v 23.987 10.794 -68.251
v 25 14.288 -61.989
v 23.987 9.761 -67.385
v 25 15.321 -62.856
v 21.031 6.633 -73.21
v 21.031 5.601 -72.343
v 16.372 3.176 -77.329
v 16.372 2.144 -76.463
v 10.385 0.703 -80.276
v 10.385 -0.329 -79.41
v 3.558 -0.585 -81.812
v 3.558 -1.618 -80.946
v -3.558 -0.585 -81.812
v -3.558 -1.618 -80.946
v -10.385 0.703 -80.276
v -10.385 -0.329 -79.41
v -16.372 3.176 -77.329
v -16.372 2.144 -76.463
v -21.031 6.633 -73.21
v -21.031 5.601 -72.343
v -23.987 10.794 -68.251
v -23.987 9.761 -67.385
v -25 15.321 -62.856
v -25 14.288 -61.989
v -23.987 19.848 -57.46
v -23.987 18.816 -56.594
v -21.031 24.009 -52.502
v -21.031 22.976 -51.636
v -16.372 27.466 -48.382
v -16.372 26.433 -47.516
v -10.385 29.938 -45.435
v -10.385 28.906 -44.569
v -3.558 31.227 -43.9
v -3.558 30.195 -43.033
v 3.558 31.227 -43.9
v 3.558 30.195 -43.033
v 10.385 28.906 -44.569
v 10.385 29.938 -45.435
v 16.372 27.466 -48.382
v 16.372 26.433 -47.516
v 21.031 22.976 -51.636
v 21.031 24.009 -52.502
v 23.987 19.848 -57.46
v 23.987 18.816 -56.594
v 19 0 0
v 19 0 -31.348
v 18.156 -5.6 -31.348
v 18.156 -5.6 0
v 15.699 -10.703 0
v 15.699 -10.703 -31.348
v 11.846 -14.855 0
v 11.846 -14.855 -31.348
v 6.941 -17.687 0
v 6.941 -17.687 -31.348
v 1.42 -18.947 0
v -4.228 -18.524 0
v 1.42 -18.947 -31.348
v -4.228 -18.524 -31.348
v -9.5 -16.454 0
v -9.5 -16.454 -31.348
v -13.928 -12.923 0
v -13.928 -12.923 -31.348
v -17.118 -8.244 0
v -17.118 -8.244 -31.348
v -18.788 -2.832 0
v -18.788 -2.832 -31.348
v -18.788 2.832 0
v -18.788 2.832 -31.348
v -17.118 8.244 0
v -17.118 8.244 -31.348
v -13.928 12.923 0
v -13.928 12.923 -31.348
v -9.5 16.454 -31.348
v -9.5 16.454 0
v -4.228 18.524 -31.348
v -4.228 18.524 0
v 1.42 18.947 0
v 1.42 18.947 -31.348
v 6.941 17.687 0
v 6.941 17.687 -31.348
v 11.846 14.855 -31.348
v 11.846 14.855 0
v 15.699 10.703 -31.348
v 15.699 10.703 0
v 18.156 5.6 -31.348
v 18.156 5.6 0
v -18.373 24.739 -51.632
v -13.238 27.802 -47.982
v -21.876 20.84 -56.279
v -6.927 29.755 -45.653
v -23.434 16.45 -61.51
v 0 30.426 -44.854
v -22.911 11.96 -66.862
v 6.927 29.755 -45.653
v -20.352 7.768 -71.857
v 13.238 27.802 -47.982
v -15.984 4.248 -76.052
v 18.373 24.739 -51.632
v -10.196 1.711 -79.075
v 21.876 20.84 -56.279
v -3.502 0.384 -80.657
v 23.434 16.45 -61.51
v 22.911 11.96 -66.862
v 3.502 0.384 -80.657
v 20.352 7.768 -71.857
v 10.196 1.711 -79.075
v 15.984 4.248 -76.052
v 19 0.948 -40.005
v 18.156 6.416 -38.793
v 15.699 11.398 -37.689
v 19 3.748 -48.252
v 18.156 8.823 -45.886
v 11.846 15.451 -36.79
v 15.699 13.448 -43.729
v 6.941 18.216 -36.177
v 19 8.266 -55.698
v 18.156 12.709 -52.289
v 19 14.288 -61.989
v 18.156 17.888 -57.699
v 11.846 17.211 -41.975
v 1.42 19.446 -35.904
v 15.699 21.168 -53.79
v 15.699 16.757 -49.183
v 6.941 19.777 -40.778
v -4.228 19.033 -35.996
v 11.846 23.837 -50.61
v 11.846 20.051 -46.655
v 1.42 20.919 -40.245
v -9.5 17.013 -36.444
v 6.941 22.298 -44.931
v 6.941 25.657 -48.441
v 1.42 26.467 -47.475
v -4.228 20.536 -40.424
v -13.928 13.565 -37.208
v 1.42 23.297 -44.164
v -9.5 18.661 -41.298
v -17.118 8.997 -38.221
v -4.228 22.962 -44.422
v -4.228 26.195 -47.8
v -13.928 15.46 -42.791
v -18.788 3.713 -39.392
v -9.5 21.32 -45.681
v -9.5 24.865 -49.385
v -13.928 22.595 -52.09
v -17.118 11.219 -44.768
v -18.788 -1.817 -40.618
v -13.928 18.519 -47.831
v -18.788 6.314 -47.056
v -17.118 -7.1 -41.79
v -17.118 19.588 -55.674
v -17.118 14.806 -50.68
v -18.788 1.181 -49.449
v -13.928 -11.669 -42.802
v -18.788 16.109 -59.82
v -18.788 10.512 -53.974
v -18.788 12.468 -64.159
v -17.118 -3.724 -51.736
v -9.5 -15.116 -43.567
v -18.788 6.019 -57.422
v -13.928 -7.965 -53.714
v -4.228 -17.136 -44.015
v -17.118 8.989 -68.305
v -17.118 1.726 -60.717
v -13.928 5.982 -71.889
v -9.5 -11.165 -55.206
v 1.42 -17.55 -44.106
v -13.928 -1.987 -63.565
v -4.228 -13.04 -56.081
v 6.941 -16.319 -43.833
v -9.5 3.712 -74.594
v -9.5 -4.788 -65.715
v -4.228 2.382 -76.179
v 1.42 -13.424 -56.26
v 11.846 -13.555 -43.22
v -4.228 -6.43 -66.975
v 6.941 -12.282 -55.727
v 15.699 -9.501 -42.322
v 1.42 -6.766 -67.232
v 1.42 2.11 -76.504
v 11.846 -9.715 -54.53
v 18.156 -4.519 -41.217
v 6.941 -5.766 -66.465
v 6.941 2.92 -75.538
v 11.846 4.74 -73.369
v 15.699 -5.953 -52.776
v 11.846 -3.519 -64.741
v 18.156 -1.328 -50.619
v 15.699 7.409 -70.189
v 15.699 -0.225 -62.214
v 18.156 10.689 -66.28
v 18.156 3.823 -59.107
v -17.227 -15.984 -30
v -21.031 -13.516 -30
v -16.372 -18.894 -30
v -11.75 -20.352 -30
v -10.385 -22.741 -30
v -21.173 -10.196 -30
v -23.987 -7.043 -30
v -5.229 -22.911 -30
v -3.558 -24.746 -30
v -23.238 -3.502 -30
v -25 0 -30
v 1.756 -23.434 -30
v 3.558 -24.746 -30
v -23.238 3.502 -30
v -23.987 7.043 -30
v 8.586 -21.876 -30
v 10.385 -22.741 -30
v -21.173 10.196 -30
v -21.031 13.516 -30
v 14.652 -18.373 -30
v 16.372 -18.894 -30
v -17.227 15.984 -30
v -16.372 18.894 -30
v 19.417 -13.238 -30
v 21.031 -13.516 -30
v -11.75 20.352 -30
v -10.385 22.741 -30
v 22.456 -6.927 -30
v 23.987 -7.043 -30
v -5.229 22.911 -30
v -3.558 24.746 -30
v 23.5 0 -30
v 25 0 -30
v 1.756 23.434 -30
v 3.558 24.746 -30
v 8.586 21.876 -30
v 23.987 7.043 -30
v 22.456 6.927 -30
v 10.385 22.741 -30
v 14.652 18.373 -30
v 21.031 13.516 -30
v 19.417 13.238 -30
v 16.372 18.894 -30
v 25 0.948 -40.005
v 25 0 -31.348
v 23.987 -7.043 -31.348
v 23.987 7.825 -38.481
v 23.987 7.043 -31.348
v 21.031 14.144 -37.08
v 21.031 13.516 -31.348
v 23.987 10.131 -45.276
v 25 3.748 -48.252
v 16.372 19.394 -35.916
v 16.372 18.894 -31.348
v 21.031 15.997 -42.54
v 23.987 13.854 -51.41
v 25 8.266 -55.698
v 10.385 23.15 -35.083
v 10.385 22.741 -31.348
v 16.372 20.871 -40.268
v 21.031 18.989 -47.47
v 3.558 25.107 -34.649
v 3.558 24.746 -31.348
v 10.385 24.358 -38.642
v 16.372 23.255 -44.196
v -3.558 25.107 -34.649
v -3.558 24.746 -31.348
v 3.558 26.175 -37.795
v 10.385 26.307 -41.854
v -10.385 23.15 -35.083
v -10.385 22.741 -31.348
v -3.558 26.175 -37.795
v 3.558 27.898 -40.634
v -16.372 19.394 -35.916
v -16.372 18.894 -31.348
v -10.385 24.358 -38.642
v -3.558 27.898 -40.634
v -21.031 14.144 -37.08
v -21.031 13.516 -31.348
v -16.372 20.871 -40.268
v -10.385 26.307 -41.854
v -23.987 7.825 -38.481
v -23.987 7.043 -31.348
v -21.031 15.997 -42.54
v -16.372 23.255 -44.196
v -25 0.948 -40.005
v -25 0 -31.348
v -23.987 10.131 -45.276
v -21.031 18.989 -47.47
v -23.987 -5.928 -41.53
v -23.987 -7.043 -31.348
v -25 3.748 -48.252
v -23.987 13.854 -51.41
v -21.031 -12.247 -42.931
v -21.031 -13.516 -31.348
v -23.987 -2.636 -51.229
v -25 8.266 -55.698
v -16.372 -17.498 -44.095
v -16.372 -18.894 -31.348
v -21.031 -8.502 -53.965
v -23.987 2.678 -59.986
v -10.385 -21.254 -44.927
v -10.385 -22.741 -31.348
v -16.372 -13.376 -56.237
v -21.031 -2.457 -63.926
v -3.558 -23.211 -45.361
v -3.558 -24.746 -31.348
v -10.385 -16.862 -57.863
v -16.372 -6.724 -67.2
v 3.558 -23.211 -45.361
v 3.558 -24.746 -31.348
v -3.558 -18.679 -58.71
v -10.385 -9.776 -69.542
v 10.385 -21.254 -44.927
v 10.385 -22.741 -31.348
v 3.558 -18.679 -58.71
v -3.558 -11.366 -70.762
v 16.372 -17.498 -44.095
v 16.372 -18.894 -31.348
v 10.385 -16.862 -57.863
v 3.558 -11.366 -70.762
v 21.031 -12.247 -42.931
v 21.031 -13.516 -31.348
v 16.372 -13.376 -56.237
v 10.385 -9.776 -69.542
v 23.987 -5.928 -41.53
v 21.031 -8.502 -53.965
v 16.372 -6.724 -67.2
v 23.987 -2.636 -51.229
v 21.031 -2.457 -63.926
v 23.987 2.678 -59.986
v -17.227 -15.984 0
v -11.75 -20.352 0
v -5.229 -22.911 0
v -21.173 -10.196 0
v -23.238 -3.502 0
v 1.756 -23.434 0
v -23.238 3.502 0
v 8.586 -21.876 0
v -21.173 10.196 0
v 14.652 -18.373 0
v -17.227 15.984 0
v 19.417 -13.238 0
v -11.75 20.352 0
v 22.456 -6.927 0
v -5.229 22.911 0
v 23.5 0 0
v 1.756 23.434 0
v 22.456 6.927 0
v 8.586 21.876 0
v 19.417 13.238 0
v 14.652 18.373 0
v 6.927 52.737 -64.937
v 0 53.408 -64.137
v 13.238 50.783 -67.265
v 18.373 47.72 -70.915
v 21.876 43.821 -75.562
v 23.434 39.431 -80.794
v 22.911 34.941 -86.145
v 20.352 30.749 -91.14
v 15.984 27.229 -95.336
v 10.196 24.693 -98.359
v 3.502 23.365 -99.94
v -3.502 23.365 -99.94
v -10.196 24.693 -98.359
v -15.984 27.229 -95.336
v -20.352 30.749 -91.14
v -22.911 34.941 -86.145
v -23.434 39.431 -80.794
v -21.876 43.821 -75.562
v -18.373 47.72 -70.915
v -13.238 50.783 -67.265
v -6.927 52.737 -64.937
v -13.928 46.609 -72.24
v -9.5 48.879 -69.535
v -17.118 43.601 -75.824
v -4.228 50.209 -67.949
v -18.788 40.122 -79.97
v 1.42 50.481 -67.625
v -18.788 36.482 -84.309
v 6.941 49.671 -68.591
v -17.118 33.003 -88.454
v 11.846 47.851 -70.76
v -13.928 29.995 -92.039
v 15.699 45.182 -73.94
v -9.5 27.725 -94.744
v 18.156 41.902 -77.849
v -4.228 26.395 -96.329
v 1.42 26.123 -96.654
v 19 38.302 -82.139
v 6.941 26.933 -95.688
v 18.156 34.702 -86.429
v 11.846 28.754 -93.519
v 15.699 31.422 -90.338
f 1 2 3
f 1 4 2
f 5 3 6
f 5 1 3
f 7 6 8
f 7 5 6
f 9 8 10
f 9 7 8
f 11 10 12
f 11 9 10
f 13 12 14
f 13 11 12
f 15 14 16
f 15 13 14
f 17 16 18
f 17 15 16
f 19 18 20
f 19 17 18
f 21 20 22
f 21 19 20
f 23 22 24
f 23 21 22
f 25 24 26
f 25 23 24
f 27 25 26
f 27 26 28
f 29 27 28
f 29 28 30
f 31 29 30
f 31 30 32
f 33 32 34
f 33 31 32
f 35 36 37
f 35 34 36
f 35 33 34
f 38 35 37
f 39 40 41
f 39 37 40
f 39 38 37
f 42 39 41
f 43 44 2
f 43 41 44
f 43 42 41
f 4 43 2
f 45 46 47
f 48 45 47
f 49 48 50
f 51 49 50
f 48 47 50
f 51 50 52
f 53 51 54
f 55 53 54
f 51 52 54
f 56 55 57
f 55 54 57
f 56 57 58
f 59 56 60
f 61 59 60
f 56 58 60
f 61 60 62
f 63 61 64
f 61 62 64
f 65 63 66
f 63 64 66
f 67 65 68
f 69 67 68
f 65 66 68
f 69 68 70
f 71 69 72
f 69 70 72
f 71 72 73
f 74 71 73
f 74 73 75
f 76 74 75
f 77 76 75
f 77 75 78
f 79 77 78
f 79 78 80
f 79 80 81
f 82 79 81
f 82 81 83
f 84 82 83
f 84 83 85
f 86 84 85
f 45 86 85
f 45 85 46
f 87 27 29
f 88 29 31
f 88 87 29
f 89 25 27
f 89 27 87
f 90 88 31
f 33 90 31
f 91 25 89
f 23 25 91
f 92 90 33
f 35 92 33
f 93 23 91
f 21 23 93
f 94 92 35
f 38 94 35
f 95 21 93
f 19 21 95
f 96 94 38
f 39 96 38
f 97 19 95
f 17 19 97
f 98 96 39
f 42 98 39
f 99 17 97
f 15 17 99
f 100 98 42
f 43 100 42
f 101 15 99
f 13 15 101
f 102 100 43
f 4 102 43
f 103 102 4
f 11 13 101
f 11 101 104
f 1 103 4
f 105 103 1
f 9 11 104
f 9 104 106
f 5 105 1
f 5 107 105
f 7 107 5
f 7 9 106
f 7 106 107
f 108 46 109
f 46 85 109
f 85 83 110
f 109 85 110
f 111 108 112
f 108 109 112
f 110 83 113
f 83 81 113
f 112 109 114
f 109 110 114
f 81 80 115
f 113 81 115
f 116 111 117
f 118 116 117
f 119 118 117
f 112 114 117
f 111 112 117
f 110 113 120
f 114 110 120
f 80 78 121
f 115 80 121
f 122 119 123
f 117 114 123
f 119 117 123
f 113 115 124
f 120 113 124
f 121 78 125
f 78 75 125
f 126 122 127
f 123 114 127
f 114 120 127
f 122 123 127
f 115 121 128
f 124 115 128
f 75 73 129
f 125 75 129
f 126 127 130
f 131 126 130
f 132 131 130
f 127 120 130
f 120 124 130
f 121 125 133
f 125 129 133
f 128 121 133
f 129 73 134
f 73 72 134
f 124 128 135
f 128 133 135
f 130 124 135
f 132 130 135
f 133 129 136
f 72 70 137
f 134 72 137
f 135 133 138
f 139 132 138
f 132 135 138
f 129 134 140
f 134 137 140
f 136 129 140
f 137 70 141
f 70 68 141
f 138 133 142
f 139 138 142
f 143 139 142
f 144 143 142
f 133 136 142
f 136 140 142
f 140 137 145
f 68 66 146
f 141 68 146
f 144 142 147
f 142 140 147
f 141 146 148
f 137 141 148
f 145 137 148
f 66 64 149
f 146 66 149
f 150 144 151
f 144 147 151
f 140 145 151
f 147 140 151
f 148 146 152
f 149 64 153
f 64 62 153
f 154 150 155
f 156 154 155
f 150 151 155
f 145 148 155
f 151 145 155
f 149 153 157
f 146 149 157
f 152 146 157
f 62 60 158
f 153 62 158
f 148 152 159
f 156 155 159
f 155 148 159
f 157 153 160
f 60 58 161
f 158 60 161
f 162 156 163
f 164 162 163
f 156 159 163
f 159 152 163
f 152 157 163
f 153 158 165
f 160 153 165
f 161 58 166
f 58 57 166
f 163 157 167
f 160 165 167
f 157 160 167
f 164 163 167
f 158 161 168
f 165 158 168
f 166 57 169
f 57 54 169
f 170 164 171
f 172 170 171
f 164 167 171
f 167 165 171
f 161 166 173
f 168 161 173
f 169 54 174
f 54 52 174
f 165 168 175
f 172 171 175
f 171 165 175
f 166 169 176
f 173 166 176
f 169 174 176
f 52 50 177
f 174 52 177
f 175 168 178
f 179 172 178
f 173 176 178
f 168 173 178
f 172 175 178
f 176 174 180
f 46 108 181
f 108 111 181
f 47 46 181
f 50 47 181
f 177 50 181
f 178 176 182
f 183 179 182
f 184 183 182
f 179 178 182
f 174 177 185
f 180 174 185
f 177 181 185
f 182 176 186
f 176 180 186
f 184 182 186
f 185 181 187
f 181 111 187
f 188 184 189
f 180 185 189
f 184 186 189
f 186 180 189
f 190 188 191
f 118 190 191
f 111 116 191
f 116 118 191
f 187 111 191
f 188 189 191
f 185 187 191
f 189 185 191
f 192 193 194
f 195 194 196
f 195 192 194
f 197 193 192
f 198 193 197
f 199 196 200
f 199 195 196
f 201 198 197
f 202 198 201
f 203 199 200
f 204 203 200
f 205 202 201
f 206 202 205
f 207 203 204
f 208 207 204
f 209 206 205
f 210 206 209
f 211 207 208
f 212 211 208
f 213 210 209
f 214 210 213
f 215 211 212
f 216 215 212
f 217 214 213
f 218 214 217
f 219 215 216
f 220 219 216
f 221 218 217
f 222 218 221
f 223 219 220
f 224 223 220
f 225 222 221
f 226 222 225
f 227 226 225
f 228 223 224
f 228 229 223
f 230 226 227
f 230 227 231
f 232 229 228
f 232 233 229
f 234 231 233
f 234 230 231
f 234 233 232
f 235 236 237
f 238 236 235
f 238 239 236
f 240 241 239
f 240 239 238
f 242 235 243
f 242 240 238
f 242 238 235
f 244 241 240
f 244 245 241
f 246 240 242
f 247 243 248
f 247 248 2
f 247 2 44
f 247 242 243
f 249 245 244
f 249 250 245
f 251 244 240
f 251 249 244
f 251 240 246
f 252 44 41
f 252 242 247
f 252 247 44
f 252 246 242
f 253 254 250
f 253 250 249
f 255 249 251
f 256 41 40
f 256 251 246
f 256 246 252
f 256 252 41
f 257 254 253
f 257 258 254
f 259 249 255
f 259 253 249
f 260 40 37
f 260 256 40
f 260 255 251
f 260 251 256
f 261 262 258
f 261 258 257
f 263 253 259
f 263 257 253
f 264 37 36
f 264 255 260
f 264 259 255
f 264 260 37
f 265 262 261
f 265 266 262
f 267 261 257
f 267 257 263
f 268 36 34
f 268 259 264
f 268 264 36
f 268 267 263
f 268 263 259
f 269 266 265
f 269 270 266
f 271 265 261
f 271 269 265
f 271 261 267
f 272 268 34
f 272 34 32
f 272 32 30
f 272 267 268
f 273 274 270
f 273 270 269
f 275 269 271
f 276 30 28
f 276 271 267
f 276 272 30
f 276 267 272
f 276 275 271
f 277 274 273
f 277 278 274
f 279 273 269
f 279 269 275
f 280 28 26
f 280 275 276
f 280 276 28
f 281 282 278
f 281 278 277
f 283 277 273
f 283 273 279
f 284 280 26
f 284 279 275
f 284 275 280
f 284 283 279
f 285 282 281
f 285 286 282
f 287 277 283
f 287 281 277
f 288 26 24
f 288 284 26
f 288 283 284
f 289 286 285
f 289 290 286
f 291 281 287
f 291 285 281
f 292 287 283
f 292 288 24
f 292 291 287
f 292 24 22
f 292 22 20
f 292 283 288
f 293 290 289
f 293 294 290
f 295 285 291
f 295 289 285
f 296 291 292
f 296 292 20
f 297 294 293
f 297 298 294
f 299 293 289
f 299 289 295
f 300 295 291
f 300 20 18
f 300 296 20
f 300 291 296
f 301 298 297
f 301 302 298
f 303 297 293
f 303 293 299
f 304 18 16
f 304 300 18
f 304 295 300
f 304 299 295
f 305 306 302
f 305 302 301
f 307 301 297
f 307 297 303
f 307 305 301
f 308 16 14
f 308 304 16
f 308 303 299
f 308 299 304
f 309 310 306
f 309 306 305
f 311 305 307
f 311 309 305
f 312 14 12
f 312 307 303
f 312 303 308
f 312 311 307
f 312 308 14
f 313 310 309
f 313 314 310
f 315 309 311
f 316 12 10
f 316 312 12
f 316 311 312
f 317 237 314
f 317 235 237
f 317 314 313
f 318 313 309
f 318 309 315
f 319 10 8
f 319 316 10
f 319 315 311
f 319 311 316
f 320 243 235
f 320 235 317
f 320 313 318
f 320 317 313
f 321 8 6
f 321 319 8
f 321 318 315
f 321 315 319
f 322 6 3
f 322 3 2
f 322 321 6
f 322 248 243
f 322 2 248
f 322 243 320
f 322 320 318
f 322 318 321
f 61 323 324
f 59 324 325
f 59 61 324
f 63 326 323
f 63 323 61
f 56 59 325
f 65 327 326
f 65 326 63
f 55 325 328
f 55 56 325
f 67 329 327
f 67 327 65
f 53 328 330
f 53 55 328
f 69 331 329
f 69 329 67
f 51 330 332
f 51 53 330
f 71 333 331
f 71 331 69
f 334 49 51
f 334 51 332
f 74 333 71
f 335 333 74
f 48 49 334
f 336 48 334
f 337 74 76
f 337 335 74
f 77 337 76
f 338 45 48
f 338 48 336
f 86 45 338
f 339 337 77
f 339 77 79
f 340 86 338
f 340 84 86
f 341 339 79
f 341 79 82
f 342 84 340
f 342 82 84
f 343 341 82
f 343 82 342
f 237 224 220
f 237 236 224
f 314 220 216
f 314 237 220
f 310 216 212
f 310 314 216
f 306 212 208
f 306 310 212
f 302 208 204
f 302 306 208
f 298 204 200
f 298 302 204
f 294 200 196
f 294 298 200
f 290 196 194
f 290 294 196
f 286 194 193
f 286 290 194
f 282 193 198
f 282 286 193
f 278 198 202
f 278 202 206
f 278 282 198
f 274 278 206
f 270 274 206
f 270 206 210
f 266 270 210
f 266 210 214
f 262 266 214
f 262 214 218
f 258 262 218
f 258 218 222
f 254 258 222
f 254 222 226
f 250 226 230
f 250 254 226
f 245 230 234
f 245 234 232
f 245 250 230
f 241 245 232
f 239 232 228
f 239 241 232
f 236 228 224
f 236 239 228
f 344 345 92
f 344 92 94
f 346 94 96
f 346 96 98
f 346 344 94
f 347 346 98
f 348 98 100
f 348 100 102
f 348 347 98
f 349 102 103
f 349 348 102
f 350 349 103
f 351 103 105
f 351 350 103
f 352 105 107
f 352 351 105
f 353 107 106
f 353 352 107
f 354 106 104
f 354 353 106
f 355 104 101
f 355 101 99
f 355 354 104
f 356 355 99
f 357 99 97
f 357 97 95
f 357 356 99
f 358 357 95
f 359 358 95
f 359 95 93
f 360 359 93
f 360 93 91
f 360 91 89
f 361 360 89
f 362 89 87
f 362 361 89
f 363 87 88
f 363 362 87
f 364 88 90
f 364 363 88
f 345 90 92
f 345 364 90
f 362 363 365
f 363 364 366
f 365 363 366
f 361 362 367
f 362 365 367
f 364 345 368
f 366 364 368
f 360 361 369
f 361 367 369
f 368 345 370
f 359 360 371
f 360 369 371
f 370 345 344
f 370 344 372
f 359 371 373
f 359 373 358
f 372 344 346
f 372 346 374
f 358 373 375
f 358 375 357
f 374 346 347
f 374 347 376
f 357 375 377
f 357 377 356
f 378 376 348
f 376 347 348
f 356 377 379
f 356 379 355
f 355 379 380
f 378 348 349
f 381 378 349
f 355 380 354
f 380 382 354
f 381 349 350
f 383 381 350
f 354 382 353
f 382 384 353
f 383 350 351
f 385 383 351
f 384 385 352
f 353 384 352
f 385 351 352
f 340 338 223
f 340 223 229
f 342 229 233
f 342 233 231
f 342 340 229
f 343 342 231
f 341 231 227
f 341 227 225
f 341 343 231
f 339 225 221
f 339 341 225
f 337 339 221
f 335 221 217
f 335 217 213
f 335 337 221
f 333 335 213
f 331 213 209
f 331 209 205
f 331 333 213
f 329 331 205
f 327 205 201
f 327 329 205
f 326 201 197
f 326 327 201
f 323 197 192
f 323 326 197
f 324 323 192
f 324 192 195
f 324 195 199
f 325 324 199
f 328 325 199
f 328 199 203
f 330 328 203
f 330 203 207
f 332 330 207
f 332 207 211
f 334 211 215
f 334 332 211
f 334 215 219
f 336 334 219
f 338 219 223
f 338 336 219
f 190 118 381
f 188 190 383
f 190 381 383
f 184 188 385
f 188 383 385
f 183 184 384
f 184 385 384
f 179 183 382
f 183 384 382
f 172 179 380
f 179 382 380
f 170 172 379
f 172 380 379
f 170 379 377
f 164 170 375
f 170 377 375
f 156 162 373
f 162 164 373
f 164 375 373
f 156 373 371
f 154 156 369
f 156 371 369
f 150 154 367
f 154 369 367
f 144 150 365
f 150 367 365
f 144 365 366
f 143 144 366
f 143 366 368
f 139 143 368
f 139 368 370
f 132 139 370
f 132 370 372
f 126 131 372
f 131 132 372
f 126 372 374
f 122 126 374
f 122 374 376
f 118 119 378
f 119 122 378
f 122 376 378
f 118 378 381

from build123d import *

# Parameters (mm, degrees)
ESQUISSE1_R             = 25
ESQUISSE1_R_2           = 19
ESQUISSE3_R             = 27.5
ESQUISSE3_R_2           = 23.5
ENL_V_MAT_EXTRU_1_DEPTH = 30
ESQUISSE4_R             = 27.5
ESQUISSE4_R_2           = 23.5
ENL_V_MAT_EXTRU_2_DEPTH = 30


with BuildPart() as part:
    # Balayage1: sweep along a path in Esquisse2
    with BuildLine(Plane(origin=(0, 0, 0), x_dir=(0, 0, -1), z_dir=(1, 0, 0))) as balayage1_path:
        Line((0, 0), (31.347693674, 0))
        ThreePointArc((31.347693674, 0), (48.252424143, 3.747688519), (61.989471399, 14.288495613))
        Line((61.989471399, 14.288495613), (82.139380484, 38.302222156))
    # Esquisse1 → Balayage1 (sweep)
    with BuildSketch(Plane.XY):
        Circle(ESQUISSE1_R)
        Circle(ESQUISSE1_R_2, mode=Mode.SUBTRACT)
    sweep(path=balayage1_path.line)

    # Esquisse3 → Enlèv. mat.-Extru.1 (cut)
    with BuildSketch(Plane.XY):
        Circle(ESQUISSE3_R)
        Circle(ESQUISSE3_R_2, mode=Mode.SUBTRACT)
    extrude(amount=-ENL_V_MAT_EXTRU_1_DEPTH, mode=Mode.SUBTRACT)

    # Esquisse4 → Enlèv. mat.-Extru.2 (cut)
    with BuildSketch(Plane(origin=(0, 62.922415981, -52.798176043), x_dir=(1, 0, 0), z_dir=(0, 0.7660444431189795, -0.6427876096865377))):
        with Locations((0, 38.302222156)):
            Circle(ESQUISSE4_R)
        with Locations(Location((0, 38.302222156, 0), (0, 0, 270))):
            Circle(ESQUISSE4_R_2, mode=Mode.SUBTRACT)
    extrude(amount=-ENL_V_MAT_EXTRU_2_DEPTH, mode=Mode.SUBTRACT)


solid = part.part
